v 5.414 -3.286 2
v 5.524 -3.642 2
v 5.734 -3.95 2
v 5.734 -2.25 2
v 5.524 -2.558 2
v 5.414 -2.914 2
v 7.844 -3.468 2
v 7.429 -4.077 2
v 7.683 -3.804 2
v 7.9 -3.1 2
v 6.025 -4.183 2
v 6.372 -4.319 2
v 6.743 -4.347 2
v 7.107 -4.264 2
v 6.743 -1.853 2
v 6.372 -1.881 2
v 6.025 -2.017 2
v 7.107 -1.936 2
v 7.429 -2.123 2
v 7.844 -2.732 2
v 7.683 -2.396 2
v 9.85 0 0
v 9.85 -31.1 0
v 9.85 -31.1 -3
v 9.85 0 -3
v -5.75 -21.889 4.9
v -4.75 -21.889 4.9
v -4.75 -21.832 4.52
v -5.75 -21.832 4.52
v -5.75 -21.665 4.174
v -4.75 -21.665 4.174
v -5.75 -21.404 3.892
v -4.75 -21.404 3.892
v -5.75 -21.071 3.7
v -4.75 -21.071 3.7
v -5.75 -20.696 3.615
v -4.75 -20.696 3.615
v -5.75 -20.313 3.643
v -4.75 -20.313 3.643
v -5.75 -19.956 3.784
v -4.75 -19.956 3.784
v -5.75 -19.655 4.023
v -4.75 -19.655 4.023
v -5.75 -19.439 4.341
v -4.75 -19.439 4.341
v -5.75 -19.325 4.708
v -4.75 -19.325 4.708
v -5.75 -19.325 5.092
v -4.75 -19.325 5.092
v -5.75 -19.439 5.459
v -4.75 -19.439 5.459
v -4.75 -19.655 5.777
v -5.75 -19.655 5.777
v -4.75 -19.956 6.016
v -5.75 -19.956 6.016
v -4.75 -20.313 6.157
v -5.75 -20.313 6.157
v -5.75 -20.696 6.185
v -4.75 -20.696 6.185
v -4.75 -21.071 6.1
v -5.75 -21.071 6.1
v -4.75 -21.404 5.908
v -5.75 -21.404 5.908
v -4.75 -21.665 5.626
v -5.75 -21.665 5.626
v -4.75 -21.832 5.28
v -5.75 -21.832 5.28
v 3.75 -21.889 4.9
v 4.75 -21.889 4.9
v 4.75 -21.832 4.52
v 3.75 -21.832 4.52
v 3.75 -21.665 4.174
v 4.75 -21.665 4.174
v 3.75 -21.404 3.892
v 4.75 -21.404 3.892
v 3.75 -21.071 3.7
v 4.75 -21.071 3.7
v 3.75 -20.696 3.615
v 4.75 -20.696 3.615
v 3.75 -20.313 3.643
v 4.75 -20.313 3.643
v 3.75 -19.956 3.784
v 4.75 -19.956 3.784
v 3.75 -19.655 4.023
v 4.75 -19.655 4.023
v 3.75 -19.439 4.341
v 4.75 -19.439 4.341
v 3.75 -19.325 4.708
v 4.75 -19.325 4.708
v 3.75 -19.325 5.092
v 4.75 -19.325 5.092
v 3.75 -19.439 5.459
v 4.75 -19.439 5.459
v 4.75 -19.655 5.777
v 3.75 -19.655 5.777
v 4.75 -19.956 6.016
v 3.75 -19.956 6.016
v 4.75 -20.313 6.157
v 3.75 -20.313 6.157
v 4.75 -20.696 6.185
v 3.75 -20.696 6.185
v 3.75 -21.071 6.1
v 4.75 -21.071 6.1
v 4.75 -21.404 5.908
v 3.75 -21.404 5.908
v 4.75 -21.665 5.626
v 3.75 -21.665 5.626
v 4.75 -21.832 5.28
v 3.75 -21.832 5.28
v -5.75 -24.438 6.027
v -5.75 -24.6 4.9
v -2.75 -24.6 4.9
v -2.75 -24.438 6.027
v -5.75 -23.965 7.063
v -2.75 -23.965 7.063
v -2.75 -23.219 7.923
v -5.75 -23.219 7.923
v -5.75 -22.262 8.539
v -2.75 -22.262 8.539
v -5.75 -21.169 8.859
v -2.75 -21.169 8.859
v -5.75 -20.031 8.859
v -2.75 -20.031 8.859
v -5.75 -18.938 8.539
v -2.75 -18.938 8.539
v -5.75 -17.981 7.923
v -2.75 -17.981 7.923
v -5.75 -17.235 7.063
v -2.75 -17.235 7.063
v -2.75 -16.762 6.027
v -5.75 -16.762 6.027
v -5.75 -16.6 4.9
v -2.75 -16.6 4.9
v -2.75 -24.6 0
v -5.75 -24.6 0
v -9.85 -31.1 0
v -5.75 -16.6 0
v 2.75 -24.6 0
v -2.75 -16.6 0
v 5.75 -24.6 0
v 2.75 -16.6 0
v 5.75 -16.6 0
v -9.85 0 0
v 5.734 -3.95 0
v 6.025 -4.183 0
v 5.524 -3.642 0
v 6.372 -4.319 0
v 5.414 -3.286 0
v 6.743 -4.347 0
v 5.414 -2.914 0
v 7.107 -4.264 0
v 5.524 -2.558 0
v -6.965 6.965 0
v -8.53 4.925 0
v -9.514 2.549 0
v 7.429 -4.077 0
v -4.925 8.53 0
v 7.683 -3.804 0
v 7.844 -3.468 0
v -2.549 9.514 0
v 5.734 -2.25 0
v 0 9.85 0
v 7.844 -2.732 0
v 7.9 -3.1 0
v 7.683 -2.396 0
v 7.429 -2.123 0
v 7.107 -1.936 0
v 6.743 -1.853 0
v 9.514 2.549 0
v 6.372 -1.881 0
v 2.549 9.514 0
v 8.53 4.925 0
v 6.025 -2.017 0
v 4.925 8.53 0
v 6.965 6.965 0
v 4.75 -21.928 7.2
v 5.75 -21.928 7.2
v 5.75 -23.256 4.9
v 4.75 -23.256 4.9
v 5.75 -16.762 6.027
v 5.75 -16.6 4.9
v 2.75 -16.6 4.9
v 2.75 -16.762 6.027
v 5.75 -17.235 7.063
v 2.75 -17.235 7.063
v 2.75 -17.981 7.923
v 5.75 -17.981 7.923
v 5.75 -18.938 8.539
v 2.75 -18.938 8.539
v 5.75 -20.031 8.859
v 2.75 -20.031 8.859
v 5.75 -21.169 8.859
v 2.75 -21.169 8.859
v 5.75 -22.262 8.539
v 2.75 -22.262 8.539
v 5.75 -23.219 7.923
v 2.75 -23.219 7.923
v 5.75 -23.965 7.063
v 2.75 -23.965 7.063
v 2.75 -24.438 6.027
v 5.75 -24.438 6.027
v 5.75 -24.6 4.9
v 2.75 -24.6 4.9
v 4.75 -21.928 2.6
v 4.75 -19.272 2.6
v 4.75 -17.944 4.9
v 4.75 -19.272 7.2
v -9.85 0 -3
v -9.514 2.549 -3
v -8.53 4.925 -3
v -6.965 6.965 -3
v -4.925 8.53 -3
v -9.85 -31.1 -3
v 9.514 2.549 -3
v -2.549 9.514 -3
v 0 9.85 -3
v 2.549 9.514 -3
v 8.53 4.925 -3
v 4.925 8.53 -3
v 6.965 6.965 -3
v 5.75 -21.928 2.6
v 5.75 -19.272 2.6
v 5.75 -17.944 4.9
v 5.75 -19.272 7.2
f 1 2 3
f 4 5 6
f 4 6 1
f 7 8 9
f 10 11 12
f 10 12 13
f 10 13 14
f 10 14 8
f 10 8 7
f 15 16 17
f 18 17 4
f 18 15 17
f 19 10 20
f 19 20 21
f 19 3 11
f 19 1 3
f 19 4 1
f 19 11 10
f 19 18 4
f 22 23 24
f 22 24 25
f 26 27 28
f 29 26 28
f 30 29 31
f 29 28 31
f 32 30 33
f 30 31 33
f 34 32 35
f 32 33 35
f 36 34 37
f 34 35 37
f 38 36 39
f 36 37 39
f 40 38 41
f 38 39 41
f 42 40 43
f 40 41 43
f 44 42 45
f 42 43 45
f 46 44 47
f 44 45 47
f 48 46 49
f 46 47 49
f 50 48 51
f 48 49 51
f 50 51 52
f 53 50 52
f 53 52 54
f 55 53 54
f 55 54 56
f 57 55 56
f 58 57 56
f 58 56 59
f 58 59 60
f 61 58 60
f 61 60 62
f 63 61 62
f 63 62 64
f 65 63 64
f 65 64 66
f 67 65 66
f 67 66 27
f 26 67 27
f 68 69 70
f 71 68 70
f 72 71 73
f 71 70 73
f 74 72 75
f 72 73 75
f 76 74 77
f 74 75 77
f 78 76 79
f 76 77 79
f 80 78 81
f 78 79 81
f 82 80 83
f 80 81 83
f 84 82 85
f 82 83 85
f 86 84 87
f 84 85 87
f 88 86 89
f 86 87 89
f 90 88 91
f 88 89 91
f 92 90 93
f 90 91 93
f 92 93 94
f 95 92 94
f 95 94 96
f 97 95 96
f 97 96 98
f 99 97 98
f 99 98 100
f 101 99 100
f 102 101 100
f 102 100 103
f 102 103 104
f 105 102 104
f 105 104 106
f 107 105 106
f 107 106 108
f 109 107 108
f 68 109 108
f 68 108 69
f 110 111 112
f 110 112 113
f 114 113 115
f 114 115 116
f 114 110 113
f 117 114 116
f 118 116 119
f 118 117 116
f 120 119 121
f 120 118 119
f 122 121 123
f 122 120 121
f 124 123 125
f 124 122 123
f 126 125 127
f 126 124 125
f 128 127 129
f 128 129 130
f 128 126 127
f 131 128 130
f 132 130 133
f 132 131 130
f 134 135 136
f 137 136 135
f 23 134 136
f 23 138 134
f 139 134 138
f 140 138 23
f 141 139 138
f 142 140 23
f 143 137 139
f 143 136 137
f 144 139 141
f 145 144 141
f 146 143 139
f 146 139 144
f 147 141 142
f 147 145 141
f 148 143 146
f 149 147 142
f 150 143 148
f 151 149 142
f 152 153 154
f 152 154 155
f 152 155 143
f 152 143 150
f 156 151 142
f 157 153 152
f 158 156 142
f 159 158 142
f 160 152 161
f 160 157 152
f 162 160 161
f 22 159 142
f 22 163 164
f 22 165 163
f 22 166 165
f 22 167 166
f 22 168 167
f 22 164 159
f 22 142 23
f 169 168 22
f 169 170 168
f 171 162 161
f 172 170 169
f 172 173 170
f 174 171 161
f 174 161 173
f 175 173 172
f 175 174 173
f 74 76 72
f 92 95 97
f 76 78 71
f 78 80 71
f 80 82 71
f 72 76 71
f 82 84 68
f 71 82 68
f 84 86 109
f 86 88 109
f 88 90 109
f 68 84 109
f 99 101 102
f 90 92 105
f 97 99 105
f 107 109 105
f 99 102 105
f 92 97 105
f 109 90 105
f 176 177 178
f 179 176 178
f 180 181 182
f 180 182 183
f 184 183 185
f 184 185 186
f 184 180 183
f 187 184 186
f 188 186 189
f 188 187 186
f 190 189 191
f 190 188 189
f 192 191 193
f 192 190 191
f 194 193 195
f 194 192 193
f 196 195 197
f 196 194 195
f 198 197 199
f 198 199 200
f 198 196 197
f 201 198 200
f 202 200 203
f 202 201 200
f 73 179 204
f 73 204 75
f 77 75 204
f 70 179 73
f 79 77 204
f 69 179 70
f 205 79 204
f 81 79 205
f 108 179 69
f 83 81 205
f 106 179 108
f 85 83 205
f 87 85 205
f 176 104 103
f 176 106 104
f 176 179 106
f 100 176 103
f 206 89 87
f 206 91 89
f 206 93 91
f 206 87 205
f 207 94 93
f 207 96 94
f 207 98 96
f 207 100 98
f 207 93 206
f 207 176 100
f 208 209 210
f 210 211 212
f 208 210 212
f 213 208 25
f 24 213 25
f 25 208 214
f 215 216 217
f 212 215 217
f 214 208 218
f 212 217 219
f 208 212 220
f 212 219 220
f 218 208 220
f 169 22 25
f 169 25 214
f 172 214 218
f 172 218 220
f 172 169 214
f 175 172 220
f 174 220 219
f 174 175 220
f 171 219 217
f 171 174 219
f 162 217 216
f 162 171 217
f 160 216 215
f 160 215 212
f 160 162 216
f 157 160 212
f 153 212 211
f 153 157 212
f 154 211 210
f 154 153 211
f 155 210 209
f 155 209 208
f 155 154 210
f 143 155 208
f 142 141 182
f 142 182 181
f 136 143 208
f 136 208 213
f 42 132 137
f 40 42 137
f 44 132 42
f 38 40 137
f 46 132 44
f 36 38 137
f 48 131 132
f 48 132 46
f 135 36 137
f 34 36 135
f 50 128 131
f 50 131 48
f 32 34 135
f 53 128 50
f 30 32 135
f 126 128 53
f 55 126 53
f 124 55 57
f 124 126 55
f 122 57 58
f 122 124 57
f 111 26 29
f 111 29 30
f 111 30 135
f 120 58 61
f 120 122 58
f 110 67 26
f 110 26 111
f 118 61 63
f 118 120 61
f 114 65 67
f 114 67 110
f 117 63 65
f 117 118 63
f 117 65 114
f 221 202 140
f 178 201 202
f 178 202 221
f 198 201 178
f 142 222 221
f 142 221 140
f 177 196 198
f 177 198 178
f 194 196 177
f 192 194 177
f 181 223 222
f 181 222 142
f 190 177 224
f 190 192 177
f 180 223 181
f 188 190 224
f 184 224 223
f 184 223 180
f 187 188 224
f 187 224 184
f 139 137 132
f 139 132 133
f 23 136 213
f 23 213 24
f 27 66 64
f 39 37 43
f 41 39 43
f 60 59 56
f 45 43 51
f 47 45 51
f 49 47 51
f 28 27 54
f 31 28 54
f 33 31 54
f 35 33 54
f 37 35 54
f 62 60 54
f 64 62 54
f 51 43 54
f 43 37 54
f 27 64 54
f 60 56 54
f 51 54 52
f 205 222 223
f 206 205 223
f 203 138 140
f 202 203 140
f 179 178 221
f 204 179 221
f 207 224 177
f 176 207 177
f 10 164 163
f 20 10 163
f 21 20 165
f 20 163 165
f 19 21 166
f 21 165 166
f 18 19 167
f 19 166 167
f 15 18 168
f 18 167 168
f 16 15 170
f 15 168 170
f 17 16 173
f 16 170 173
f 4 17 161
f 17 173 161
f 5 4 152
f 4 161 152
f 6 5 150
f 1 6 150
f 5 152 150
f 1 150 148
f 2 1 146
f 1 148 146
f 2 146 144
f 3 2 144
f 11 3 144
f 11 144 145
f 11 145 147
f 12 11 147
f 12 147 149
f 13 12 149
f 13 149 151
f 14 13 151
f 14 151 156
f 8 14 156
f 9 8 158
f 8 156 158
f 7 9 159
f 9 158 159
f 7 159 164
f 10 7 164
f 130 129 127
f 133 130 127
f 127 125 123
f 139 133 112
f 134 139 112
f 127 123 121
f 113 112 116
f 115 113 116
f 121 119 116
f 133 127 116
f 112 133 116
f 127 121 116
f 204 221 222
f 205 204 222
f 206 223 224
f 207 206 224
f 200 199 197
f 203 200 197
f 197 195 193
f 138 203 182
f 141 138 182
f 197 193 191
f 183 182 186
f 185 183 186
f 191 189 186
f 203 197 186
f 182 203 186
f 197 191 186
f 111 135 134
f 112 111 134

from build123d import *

# Parameters (mm, degrees)
F0_W      = 3
F0_H      = 8
F1_DEPTH  = 3
F2_DEPTH  = 4.9
F3_DEPTH  = 4.9
F5_DEPTH  = 3
F7_DEPTH  = 3
F8_DEPTH  = 25
F9_DEPTH  = 1
F11_DEPTH = 3
F12_R     = 1.8630386708
F13_DEPTH = 1
F14_R     = 1.9023250727
F15_DEPTH = 1
F16_R     = 1.25
F17_DEPTH = 2
F18_DEPTH = 1


with BuildPart() as f1:
    # F0 (on Top) → F1 (new body)
    with BuildSketch(Plane.XY):
        with BuildLine():
            Line((9.35, -30.6), (9.35, 0))
            ThreePointArc((9.35, 0), (0, -9.35), (-9.35, 0))
            Line((-9.35, 0), (-9.35, -30.6))
            Line((-9.35, -30.6), (9.35, -30.6))
        make_face()
        with Locations((-4.25, -20.6)):
            Rectangle(F0_W, F0_H, mode=Mode.SUBTRACT)
        with Locations((4.25, -20.6)):
            Rectangle(F0_W, F0_H, mode=Mode.SUBTRACT)
        with BuildLine():
            ThreePointArc((-9.35, 0), (0, -9.35), (9.35, 0))
            ThreePointArc((9.35, 0), (0, 9.35), (-9.35, 0))
        make_face()
        with Locations((4.25, -20.6)):
            Rectangle(F0_W, F0_H)
        with Locations((-4.25, -20.6)):
            Rectangle(F0_W, F0_H)
    extrude(amount=-F1_DEPTH)

    # F0 (on Top) → F2 (join)
    with BuildSketch(Plane.XY):
        with Locations((4.25, -20.6)):
            Rectangle(F0_W, F0_H)
    extrude(amount=F2_DEPTH)

    # F0 (on Top) → F3 (join)
    with BuildSketch(Plane.XY):
        with Locations((-4.25, -20.6)):
            Rectangle(F0_W, F0_H)
    extrude(amount=F3_DEPTH)

    # F4 (on face) → F5 (join)
    with BuildSketch(Plane(origin=(-5.75, 0, 0), x_dir=(0, -1, 0), z_dir=(-1, 0, 0))):
        with BuildLine():
            Line((16.6, 4.9), (24.6, 4.9))
            ThreePointArc((24.6, 4.9), (20.6, 8.9), (16.6, 4.9))
        make_face()
    extrude(amount=-F5_DEPTH)

    # F6 (on face) → F7 (join)
    with BuildSketch(Plane.YZ.offset(5.75)):
        with BuildLine():
            Line((-17.944, 4.9), (-16.6, 4.9))
            ThreePointArc((-16.6, 4.9), (-20.6, 8.9), (-24.6, 4.9))
            Line((-24.6, 4.9), (-23.256, 4.9))
            Line((-23.256, 4.9), (-21.928, 7.2001634725))
            Line((-21.928, 7.2001634725), (-19.272, 7.2001634725))
            Line((-19.272, 7.2001634725), (-17.944, 4.9))
        make_face()
        with BuildLine():
            Line((-19.311, 4.9), (-17.944, 4.9))
            Line((-17.944, 4.9), (-19.272, 7.2001634725))
            Line((-19.272, 7.2001634725), (-21.928, 7.2001634725))
            Line((-21.928, 7.2001634725), (-23.256, 4.9))
            Line((-23.256, 4.9), (-21.889, 4.9))
            ThreePointArc((-21.889, 4.9), (-20.6, 6.189), (-19.311, 4.9))
        make_face()
    extrude(amount=-F7_DEPTH)

    # F6 (on face) → F8 (cut)
    with BuildSketch(Plane.YZ.offset(5.75)):
        with BuildLine():
            Line((-21.889, 4.9), (-19.311, 4.9))
            ThreePointArc((-19.311, 4.9), (-20.6, 6.189), (-21.889, 4.9))
        make_face()
        with BuildLine():
            ThreePointArc((-21.889, 4.9), (-20.6, 3.611), (-19.311, 4.9))
            Line((-19.311, 4.9), (-21.889, 4.9))
        make_face()
    extrude(amount=-F8_DEPTH, mode=Mode.SUBTRACT)

    # F6 (on face) → F9 (cut)
    with BuildSketch(Plane.YZ.offset(5.75)):
        with BuildLine():
            Line((-19.311, 4.9), (-17.944, 4.9))
            Line((-17.944, 4.9), (-19.272, 7.2001634725))
            Line((-19.272, 7.2001634725), (-21.928, 7.2001634725))
            Line((-21.928, 7.2001634725), (-23.256, 4.9))
            Line((-23.256, 4.9), (-21.889, 4.9))
            ThreePointArc((-21.889, 4.9), (-20.6, 6.189), (-19.311, 4.9))
        make_face()
        with BuildLine():
            Line((-19.272, 2.5998365275), (-17.944, 4.9))
            Line((-17.944, 4.9), (-19.311, 4.9))
            ThreePointArc((-19.311, 4.9), (-20.6, 3.611), (-21.889, 4.9))
            Line((-21.889, 4.9), (-23.256, 4.9))
            Line((-23.256, 4.9), (-21.928, 2.5998365275))
            Line((-21.928, 2.5998365275), (-19.272, 2.5998365275))
        make_face()
    extrude(amount=-F9_DEPTH, mode=Mode.SUBTRACT)

    # F10 (on face) → F11 (join)
    with BuildSketch(Plane.XY):
        with BuildLine():
            Line((9.85, -31.1), (9.85, 0))
            ThreePointArc((9.85, 0), (0, 9.85), (-9.85, 0))
            Line((-9.85, 0), (-9.85, -31.1))
            Line((-9.85, -31.1), (9.85, -31.1))
        make_face()
        with BuildLine():
            Line((-9.35, -30.6), (-9.35, 0))
            ThreePointArc((-9.35, 0), (0, 9.35), (9.35, 0))
            Line((9.35, 0), (9.35, -30.6))
            Line((9.35, -30.6), (-9.35, -30.6))
        make_face(mode=Mode.SUBTRACT)
    extrude(amount=-F11_DEPTH)

    # F12 (on face) → F13 (join)
    with BuildSketch(Plane.YZ.offset(-2.75)):
        with Locations((-20.6, 4.9)):
            Circle(F12_R)
    extrude(amount=-F13_DEPTH)

    # F14 (on face) → F15 (join)
    with BuildSketch(Plane(origin=(2.75, 0, 0), x_dir=(0, -1, 0), z_dir=(-1, 0, 0))):
        with Locations((20.6, 4.9)):
            Circle(F14_R)
    extrude(amount=-F15_DEPTH)

    # F16 (on face) → F17 (join)
    with BuildSketch(Plane.XY):
        with Locations((6.65, -3.1)):
            Circle(F16_R)
    extrude(amount=F17_DEPTH)

    # F18 (add): a face of the model
    f18_faces = [f1.faces().sort_by_distance(p)[0] for p in [
        (-3.75, -20.6, 4.9),
    ]]
    extrude(f18_faces, amount=F18_DEPTH)


solid = f1.part
